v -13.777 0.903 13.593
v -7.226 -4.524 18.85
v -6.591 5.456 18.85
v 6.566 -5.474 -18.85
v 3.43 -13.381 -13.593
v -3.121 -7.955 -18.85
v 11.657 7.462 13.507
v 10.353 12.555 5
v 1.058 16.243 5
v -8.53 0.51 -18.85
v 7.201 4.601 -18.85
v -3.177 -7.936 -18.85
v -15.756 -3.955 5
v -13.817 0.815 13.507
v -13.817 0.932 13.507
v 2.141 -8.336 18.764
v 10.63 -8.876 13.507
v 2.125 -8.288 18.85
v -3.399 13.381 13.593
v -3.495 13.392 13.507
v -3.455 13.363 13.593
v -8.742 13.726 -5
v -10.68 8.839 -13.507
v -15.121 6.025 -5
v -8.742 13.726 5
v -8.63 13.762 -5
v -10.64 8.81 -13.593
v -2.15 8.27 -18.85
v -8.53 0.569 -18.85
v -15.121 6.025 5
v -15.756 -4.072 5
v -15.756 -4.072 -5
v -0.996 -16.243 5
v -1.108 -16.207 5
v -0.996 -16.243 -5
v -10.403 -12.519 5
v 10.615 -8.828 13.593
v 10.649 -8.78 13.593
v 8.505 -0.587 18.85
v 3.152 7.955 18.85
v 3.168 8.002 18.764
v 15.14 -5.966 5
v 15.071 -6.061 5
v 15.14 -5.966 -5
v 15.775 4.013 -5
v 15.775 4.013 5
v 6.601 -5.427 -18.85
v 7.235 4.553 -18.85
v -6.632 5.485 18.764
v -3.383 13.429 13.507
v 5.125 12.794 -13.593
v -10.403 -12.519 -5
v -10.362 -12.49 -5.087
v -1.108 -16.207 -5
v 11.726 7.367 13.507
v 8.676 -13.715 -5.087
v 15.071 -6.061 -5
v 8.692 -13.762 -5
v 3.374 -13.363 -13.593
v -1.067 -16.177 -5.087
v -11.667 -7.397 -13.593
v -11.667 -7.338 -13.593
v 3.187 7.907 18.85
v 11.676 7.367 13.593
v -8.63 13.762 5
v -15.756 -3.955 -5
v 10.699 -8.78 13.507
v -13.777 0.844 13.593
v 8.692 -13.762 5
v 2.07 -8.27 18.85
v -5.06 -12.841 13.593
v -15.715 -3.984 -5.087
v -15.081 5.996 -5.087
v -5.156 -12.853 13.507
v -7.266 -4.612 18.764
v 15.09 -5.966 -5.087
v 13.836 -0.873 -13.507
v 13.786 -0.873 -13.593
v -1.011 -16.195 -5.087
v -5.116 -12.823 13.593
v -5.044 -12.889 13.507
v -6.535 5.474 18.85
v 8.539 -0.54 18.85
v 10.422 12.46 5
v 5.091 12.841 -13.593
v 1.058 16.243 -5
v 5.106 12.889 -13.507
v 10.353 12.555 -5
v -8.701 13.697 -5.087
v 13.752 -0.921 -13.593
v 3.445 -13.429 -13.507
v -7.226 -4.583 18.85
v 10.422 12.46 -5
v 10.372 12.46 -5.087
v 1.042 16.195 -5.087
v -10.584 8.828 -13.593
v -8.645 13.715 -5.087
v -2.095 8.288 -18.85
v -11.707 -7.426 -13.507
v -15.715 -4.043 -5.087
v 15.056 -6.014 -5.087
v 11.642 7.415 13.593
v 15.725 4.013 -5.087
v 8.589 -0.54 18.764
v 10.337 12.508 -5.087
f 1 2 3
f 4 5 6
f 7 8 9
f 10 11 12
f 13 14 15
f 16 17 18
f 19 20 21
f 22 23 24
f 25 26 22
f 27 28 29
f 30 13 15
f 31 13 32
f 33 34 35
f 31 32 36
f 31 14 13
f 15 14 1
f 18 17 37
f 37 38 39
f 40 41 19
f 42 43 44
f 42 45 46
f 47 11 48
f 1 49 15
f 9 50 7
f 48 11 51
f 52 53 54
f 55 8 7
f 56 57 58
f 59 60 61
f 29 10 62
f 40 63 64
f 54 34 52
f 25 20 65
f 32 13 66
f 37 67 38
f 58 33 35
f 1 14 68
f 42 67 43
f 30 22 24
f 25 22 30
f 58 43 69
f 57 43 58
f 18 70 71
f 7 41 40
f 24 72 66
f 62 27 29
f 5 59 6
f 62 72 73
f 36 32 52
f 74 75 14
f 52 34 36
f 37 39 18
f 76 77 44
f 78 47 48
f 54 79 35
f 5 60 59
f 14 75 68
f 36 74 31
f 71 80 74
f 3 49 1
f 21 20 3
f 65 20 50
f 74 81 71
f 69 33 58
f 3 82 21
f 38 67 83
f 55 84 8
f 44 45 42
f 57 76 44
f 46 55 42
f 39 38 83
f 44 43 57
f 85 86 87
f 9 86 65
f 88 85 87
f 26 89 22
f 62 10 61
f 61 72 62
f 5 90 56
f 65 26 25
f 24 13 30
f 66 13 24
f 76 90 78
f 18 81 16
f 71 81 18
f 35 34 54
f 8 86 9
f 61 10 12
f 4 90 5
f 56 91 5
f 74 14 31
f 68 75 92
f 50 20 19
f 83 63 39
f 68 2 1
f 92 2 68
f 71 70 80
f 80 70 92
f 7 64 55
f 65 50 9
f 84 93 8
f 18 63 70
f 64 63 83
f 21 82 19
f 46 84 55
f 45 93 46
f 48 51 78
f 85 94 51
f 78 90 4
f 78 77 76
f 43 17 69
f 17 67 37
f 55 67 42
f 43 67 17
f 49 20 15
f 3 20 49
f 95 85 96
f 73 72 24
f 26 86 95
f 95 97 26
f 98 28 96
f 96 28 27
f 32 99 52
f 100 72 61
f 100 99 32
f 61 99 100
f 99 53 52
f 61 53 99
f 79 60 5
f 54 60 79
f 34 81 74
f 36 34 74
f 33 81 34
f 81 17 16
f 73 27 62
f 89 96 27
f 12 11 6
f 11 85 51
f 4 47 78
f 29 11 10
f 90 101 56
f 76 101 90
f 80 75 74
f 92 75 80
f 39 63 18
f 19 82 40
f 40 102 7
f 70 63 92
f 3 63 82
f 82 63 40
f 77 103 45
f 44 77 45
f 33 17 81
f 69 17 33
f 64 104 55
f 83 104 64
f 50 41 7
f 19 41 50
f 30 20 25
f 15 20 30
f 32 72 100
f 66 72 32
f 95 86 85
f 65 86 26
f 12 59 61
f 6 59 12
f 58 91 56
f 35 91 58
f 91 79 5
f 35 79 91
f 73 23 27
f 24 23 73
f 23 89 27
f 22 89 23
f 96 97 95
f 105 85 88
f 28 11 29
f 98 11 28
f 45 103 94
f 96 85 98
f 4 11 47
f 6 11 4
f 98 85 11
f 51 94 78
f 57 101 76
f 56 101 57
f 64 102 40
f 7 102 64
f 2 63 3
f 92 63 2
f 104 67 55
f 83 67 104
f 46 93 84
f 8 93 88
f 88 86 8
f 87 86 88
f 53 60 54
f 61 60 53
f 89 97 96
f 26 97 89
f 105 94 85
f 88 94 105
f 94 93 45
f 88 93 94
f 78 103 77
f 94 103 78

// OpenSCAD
// Auto-generated OpenSCAD file

    inner_points = 10*[[-0.10267110435699114, -1.6147732450963963, 0.5000000000008641], [-0.1026711043570435, -1.6147732450969283, -0.4999999999991359], [0.1026711043570435, 1.6147732450969283, 0.4999999999991359], [0.10267110435699114, 1.6147732450963963, -0.5000000000008641], [0.8660772310082325, -1.3667275583225522, 0.5000000000006815], [0.8660772310081802, -1.3667275583230845, -0.4999999999993185], [-1.0322025675203217, -1.2460304363672796, 0.5000000000007166], [-1.032202567520374, -1.2460304363678119, -0.49999999999928335], [1.032202567520374, 1.2460304363678119, 0.49999999999928335], [1.0322025675203217, 1.2460304363672796, -0.5000000000007166], [-0.8660772310081802, 1.3667275583230845, 0.4999999999993185], [-0.8660772310082325, 1.3667275583225522, -0.5000000000006815], [1.504013501010716, -0.596638397630546, 0.5000000000002386], [1.5040135010106637, -0.5966383976310778, -0.4999999999997614], [-1.5674677331657878, -0.40134635196262397, 0.5000000000002954], [-1.5674677331658402, -0.4013463519631557, -0.4999999999997045], [1.5674677331658402, 0.4013463519631557, 0.4999999999997045], [1.5674677331657878, 0.40134635196262397, -0.5000000000002954], [-1.5040135010106637, 0.5966383976310778, 0.4999999999997614], [-1.504013501010716, 0.596638397630546, -0.5000000000002386], [0.2110002639625055, -0.8240665545671229, 1.8763819204716008], [-0.3136713683195228, -0.7907066905295395, -1.8763819204707366], [0.3136713683195228, 0.7907066905295395, 1.8763819204707366], [-0.2110002639625055, 0.8240665545671229, -1.8763819204716008], [-0.718531199200825, -0.4553237458380063, 1.8763819204714534], [0.6550769670457008, -0.5426610037556955, -1.8763819204709191], [-0.6550769670457008, 0.5426610037556955, 1.8763819204709191], [0.718531199200825, 0.4553237458380063, -1.8763819204714534], [0.8489365339649888, -0.05397739387511649, 1.8763819204711578], [-0.8489365339649888, 0.05397739387511649, -1.8763819204711578], [-0.5075309352384453, -1.2793903004064069, 1.3506508083527466], [0.3414055987263038, -1.3333676942839572, -1.3506508083513487], [-0.3414055987263038, 1.3333676942839572, 1.3506508083513487], [0.5075309352384453, 1.2793903004064069, -1.3506508083527466], [1.0599367979273688, -0.8780439484435167, 1.3506508083524513], [-1.162607902284386, -0.7367292966531456, -1.3506508083515871], [1.162607902284386, 0.7367292966531456, 1.3506508083515871], [-1.0599367979273688, 0.8780439484435167, -1.3506508083524513], [-1.3736081662466517, 0.0873372579164117, 1.3506508083520654], [1.3736081662466517, -0.0873372579164117, -1.3506508083520654]];

    outer_points = 10*[[1.3411441290868589, 0.49569687647638716, -0.9075522136038779], [1.263452202904808, -0.49569687647638716, -1.0129200987128433], [-1.263452202904808, 0.49569687647638716, 1.0129200987128433], [-1.3411441290868589, -0.49569687647638716, 0.9075522136038779], [0.5328721345308199, 0.6202033120279035, -1.4830472442710922], [0.45518020834876893, -0.3711904409248708, -1.5884151293800577], [1.6519824877191422, 0.3711904409248708, 0.034720391489278635], [1.574290561537091, -0.6202033120279035, -0.0706474936196867], [-1.574290561537091, 0.6202033120279035, 0.0706474936196867], [-1.6519824877191422, -0.3711904409248708, -0.034720391489278635], [-0.45518020834876893, 0.3711904409248708, 1.5884151293800577], [-0.5328721345308199, -0.6202033120279035, 1.4830472442710922], [-0.4641010661832383, 0.6971525210168389, -1.4719451591541524], [-0.5417929923652892, -0.29424123193593543, -1.5773130442631174], [1.3466575224373667, 0.29424123193593543, 0.983854462530699], [1.268965596255316, -0.6971525210168389, 0.8784865774217337], [-1.268965596255316, 0.6971525210168389, -0.8784865774217337], [-1.3466575224373667, -0.29424123193593543, -0.983854462530699], [0.5417929923652892, 0.29424123193593543, 1.5773130442631174], [0.4641010661832383, -0.6971525210168389, 1.4719451591541524], [0.642271561558062, 1.8946460465314703, -0.49215801202206017], [0.6600266044377715, -1.8946460465314703, -0.4680781441363005], [-0.6600266044377715, 1.8946460465314703, 0.4680781441363005], [-0.642271561558062, -1.8946460465314703, 0.49215801202206017], [0.9531099201903453, 1.770139610979954, 0.4501145930710967], [-0.14824539011826776, -1.770139610979954, -1.043573174803515], [0.14824539011826776, 1.770139610979954, 1.043573174803515], [-0.9531099201903453, -1.770139610979954, -0.4501145930710967], [-0.3547016391559959, 1.9715952555204057, -0.4810559269051196], [0.3547016391559959, -1.9715952555204057, 0.4810559269051196], [1.4087566933394584, 1.2833458031149498, -0.29514898898768743], [0.6984060027284527, -1.2833458031149498, -1.2585457489030916], [-0.6984060027284527, 1.2833458031149498, 1.2585457489030916], [-1.4087566933394584, -1.2833458031149498, 0.29514898898768743], [0.10094513399311722, 1.4848014476554017, -1.2263195089639038], [1.2013530320027161, -1.4848014476554017, 0.2660833528055431], [-1.2013530320027161, 1.4848014476554017, -0.2660833528055431], [-0.10094513399311722, -1.4848014476554017, 1.2263195089639038], [0.9147305218996641, 1.1588393675634334, 1.2405821978378877], [-0.9147305218996641, -1.1588393675634334, -1.2405821978378877]];

    // Convex hull for inner set (I)
    module inner_hull() {
        hull() {
            for (p = inner_points) {
                translate(p) sphere(r=0.1);
            }
        }
    }

    // Convex hull for outer set (O) minus inner hull (O \ I)
    module outer_minus_inner() {
        difference() {
            hull() {
                for (p = outer_points) {
                    translate(p) sphere(r=0.1);
                }
            }
            inner_hull(); // Subtract inner hull
        }
    }

    // Convex hull for outer set (O) minus all translated inner hulls
    module outer_minus_AllTranslationInner() {
        difference() {
            hull() {
                for (p = outer_points) {
                    translate(p) sphere(r=0.1);
                }
            }
            hull() {
                translate([0,0,50]) inner_hull();
                translate([0,0,-50]) inner_hull();
            }; // Subtract translated inner hulls
        }
    }

    // Difference between outer_minus_inner and outer_minus_AllTranslationInner
    module outer_minus_inner_diff() {
        difference() {
            // Outer minus inner
            difference() {
                hull() {
                    for (p = outer_points) {
                        translate(p) sphere(r=0.1);
                    }
                }
                inner_hull();
            }

            // Subtract Outer minus AllTranslationInner
            difference() {
                hull() {
                    for (p = outer_points) {
                        translate(p) sphere(r=0.1);
                    }
                }
                hull() {
                    translate([0,0,50]) inner_hull();
                    translate([0,0,-50]) inner_hull();
                };
            }
        }
    }

    // Rendering all with colors applied
    color([1, 0, 0, 0.5]) inner_hull(); // Transparent red
    
